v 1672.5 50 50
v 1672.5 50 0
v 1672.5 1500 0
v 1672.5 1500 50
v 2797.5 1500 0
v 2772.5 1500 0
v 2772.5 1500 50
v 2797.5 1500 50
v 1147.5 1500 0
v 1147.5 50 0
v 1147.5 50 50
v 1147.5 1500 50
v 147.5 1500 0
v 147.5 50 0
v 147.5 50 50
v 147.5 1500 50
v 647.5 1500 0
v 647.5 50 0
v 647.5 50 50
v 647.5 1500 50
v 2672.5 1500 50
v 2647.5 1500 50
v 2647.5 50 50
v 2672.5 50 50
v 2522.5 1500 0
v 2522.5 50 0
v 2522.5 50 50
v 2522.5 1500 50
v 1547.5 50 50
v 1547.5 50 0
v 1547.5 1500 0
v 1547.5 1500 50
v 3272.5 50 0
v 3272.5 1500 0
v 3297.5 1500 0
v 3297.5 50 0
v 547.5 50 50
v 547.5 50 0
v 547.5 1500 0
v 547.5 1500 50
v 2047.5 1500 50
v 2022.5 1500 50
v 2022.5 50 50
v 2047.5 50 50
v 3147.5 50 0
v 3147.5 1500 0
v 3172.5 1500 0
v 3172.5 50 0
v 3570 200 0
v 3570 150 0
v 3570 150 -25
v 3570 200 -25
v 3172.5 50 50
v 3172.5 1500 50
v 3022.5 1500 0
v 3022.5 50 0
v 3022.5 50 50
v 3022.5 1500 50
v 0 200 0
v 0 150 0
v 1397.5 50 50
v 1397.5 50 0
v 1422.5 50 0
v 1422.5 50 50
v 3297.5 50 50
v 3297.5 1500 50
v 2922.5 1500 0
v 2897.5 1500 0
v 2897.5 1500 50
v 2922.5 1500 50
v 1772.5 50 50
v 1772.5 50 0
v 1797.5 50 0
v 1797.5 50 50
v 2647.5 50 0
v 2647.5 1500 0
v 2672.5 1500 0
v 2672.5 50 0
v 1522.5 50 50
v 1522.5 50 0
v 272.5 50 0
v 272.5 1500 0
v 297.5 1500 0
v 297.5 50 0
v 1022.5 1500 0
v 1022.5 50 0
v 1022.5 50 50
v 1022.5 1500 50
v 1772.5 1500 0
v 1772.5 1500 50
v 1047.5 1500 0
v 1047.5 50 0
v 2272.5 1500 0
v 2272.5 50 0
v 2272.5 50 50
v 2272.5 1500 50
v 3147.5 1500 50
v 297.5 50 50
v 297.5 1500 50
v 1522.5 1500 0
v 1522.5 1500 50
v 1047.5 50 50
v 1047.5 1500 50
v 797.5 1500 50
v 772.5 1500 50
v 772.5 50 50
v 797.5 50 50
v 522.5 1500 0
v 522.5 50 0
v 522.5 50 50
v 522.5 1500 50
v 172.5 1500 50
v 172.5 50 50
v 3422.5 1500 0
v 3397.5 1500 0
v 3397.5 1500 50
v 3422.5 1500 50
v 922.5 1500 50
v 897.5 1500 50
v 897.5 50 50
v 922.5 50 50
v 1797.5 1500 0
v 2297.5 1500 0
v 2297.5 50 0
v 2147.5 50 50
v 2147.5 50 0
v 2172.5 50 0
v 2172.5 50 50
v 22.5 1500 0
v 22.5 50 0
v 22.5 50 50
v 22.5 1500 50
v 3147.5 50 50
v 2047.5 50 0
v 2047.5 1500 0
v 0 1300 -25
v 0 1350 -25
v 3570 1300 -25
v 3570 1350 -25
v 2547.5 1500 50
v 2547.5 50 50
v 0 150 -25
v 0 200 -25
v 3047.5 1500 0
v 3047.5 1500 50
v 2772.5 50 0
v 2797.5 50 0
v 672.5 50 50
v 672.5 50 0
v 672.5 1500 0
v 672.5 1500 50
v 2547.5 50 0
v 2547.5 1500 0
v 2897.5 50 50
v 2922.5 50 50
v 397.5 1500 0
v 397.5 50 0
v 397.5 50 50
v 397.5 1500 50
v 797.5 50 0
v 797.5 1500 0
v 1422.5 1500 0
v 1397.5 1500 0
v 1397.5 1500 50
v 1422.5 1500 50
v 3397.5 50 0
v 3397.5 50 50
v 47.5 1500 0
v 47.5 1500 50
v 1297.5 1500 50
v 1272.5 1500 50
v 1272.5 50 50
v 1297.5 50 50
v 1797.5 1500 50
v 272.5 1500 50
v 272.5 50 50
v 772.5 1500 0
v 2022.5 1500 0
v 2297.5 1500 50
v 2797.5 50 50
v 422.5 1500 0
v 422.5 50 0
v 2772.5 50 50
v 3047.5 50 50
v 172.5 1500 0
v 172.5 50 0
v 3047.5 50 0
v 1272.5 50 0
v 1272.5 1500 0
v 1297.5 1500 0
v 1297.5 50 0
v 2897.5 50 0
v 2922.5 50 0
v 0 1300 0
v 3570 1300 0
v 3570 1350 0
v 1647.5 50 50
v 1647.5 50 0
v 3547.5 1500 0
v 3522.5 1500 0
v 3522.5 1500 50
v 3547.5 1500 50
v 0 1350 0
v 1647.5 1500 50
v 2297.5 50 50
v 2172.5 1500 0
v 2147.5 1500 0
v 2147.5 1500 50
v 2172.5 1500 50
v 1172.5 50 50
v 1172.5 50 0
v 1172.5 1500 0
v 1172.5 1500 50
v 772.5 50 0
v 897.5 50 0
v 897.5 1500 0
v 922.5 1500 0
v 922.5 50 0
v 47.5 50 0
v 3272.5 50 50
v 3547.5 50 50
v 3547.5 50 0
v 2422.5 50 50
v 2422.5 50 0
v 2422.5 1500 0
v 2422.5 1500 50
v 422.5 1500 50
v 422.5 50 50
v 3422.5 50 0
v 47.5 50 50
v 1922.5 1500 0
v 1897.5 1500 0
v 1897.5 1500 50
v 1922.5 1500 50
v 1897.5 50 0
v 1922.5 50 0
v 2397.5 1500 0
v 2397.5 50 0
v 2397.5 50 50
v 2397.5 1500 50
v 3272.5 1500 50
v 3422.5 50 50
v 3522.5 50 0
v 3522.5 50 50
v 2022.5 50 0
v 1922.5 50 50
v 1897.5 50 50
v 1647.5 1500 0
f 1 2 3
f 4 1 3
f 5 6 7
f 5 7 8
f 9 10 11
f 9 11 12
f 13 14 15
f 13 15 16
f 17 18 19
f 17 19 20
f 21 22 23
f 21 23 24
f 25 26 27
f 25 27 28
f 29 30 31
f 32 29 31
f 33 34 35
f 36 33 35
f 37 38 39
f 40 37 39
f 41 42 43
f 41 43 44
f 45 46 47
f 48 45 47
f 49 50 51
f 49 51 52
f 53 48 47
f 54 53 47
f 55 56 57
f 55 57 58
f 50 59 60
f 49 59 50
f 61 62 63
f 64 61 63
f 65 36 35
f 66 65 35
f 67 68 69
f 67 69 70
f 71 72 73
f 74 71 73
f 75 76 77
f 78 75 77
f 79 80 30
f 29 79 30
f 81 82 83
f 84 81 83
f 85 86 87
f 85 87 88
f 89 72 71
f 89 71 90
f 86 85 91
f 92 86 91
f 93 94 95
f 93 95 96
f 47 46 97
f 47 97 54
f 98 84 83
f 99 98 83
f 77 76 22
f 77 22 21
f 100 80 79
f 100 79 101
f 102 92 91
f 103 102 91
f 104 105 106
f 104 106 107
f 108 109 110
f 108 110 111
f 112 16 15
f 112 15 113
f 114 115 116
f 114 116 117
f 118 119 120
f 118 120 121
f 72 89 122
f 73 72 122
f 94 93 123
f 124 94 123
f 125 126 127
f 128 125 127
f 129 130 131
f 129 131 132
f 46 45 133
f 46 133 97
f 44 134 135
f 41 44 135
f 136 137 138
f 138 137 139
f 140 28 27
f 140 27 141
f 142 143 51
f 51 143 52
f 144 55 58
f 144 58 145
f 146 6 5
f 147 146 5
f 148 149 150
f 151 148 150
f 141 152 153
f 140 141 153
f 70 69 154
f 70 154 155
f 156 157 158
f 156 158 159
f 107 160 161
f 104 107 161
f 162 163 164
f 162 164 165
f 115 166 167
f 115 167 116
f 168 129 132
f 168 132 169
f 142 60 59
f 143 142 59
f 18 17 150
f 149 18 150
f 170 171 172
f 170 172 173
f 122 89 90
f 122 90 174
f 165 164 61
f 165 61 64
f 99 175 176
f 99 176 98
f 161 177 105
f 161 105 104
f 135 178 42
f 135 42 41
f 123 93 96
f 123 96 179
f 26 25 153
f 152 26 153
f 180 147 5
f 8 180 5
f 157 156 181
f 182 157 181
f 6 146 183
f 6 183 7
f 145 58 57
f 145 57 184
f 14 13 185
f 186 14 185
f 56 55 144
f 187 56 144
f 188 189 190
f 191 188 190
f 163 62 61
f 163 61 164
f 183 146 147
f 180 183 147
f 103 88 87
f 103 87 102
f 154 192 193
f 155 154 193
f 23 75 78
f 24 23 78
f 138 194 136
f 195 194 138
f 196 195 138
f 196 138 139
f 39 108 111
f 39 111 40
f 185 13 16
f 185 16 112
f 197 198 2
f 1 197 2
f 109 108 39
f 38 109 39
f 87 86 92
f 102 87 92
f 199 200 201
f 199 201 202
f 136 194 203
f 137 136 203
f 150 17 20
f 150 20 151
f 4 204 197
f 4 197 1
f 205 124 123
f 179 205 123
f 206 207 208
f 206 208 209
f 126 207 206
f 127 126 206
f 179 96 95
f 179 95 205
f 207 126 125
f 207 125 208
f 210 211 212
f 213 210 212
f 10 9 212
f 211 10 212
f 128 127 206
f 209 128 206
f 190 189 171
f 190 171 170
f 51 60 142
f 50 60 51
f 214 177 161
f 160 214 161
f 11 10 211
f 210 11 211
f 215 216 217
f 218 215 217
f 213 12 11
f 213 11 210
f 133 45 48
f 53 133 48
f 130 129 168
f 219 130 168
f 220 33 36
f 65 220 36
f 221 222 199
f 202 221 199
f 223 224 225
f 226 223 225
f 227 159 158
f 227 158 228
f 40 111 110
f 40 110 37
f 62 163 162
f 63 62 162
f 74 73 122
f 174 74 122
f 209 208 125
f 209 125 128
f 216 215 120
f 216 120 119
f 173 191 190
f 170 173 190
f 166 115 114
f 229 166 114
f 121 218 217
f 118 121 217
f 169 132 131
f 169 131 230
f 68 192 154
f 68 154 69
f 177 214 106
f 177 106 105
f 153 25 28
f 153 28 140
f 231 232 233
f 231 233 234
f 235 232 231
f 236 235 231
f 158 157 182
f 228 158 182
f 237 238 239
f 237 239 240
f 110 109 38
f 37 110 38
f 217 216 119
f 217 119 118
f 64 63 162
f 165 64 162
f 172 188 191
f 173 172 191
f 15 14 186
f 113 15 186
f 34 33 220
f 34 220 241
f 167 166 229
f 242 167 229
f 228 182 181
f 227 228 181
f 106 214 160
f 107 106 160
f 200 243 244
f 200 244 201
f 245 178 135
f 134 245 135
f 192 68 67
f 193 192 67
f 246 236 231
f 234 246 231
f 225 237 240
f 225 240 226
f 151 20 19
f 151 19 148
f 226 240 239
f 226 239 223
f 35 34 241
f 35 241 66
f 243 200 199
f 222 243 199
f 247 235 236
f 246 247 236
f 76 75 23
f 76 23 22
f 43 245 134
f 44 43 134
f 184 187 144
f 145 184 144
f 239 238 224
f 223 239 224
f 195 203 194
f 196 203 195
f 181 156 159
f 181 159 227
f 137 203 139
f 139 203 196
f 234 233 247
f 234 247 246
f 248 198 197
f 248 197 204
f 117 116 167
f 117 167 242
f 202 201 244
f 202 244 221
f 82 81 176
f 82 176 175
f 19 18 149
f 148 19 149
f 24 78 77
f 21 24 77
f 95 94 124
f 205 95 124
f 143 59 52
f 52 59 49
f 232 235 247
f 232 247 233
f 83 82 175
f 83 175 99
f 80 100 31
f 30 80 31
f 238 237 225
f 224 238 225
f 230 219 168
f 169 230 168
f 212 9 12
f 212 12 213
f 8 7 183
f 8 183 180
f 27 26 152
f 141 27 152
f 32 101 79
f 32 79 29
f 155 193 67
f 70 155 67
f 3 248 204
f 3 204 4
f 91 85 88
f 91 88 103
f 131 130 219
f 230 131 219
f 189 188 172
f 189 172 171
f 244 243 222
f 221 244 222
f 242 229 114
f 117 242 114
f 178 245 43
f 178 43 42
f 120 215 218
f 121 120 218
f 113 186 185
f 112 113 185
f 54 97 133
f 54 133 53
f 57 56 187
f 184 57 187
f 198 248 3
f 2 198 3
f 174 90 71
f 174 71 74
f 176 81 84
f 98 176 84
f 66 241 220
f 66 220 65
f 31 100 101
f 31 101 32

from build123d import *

# Parameters (mm, degrees)
F0_W     = 25
F0_H     = 1450
F1_DEPTH = 50
F2_W     = 3570
F2_H     = 50
F3_DEPTH = 25


# Not quite as in the source:
# - a feature names something its author has since deleted; it is built from what else it names


with BuildPart() as f1:
    # F0 (on Top) → F1 (new body)
    with BuildSketch(Plane.XY):
        with Locations((35, 775)):
            Rectangle(F0_W, F0_H)
    extrude(amount=F1_DEPTH)


with BuildPart() as f1b:
    # F0 (on Top) → F1, piece 2 (new body)
    with BuildSketch(Plane.XY):
        with Locations((160, 775)):
            Rectangle(F0_W, F0_H)
    extrude(amount=F1_DEPTH)


with BuildPart() as f1c:
    # F0 (on Top) → F1, piece 3 (new body)
    with BuildSketch(Plane.XY):
        with Locations((285, 775)):
            Rectangle(F0_W, F0_H)
    extrude(amount=F1_DEPTH)


with BuildPart() as f1d:
    # F0 (on Top) → F1, piece 4 (new body)
    with BuildSketch(Plane.XY):
        with Locations((410, 775)):
            Rectangle(F0_W, F0_H)
    extrude(amount=F1_DEPTH)


with BuildPart() as f1e:
    # F0 (on Top) → F1, piece 5 (new body)
    with BuildSketch(Plane.XY):
        with Locations((535, 775)):
            Rectangle(F0_W, F0_H)
    extrude(amount=F1_DEPTH)


with BuildPart() as f1f:
    # F0 (on Top) → F1, piece 6 (new body)
    with BuildSketch(Plane.XY):
        with Locations((660, 775)):
            Rectangle(F0_W, F0_H)
    extrude(amount=F1_DEPTH)


with BuildPart() as f1g:
    # F0 (on Top) → F1, piece 7 (new body)
    with BuildSketch(Plane.XY):
        with Locations((785, 775)):
            Rectangle(F0_W, F0_H)
    extrude(amount=F1_DEPTH)


with BuildPart() as f1h:
    # F0 (on Top) → F1, piece 8 (new body)
    with BuildSketch(Plane.XY):
        with Locations((910, 775)):
            Rectangle(F0_W, F0_H)
    extrude(amount=F1_DEPTH)


with BuildPart() as f1i:
    # F0 (on Top) → F1, piece 9 (new body)
    with BuildSketch(Plane.XY):
        with Locations((1035, 775)):
            Rectangle(F0_W, F0_H)
    extrude(amount=F1_DEPTH)


with BuildPart() as f1j:
    # F0 (on Top) → F1, piece 10 (new body)
    with BuildSketch(Plane.XY):
        with Locations((1160, 775)):
            Rectangle(F0_W, F0_H)
    extrude(amount=F1_DEPTH)


with BuildPart() as f1k:
    # F0 (on Top) → F1, piece 11 (new body)
    with BuildSketch(Plane.XY):
        with Locations((1285, 775)):
            Rectangle(F0_W, F0_H)
    extrude(amount=F1_DEPTH)


with BuildPart() as f1l:
    # F0 (on Top) → F1, piece 12 (new body)
    with BuildSketch(Plane.XY):
        with Locations((1410, 775)):
            Rectangle(F0_W, F0_H)
    extrude(amount=F1_DEPTH)


with BuildPart() as f1m:
    # F0 (on Top) → F1, piece 13 (new body)
    with BuildSketch(Plane.XY):
        with Locations((1535, 775)):
            Rectangle(F0_W, F0_H)
    extrude(amount=F1_DEPTH)


with BuildPart() as f1n:
    # F0 (on Top) → F1, piece 14 (new body)
    with BuildSketch(Plane.XY):
        with Locations((1660, 775)):
            Rectangle(F0_W, F0_H)
    extrude(amount=F1_DEPTH)


with BuildPart() as f1o:
    # F0 (on Top) → F1, piece 15 (new body)
    with BuildSketch(Plane.XY):
        with Locations((1785, 775)):
            Rectangle(F0_W, F0_H)
    extrude(amount=F1_DEPTH)


with BuildPart() as f1p:
    # F0 (on Top) → F1, piece 16 (new body)
    with BuildSketch(Plane.XY):
        with Locations((1910, 775)):
            Rectangle(F0_W, F0_H)
    extrude(amount=F1_DEPTH)


with BuildPart() as f1q:
    # F0 (on Top) → F1, piece 17 (new body)
    with BuildSketch(Plane.XY):
        with Locations((2035, 775)):
            Rectangle(F0_W, F0_H)
    extrude(amount=F1_DEPTH)


with BuildPart() as f1r:
    # F0 (on Top) → F1, piece 18 (new body)
    with BuildSketch(Plane.XY):
        with Locations((2160, 775)):
            Rectangle(F0_W, F0_H)
    extrude(amount=F1_DEPTH)


with BuildPart() as f1s:
    # F0 (on Top) → F1, piece 19 (new body)
    with BuildSketch(Plane.XY):
        with Locations((2285, 775)):
            Rectangle(F0_W, F0_H)
    extrude(amount=F1_DEPTH)


with BuildPart() as f1t:
    # F0 (on Top) → F1, piece 20 (new body)
    with BuildSketch(Plane.XY):
        with Locations((2410, 775)):
            Rectangle(F0_W, F0_H)
    extrude(amount=F1_DEPTH)


with BuildPart() as f1u:
    # F0 (on Top) → F1, piece 21 (new body)
    with BuildSketch(Plane.XY):
        with Locations((2535, 775)):
            Rectangle(F0_W, F0_H)
    extrude(amount=F1_DEPTH)


with BuildPart() as f1v:
    # F0 (on Top) → F1, piece 22 (new body)
    with BuildSketch(Plane.XY):
        with Locations((2660, 775)):
            Rectangle(F0_W, F0_H)
    extrude(amount=F1_DEPTH)


with BuildPart() as f1w:
    # F0 (on Top) → F1, piece 23 (new body)
    with BuildSketch(Plane.XY):
        with Locations((2785, 775)):
            Rectangle(F0_W, F0_H)
    extrude(amount=F1_DEPTH)


with BuildPart() as f1x:
    # F0 (on Top) → F1, piece 24 (new body)
    with BuildSketch(Plane.XY):
        with Locations((2910, 775)):
            Rectangle(F0_W, F0_H)
    extrude(amount=F1_DEPTH)


with BuildPart() as f1y:
    # F0 (on Top) → F1, piece 25 (new body)
    with BuildSketch(Plane.XY):
        with Locations((3035, 775)):
            Rectangle(F0_W, F0_H)
    extrude(amount=F1_DEPTH)


with BuildPart() as f1z:
    # F0 (on Top) → F1, piece 26 (new body)
    with BuildSketch(Plane.XY):
        with Locations((3160, 775)):
            Rectangle(F0_W, F0_H)
    extrude(amount=F1_DEPTH)


with BuildPart() as f1ba:
    # F0 (on Top) → F1, piece 27 (new body)
    with BuildSketch(Plane.XY):
        with Locations((3285, 775)):
            Rectangle(F0_W, F0_H)
    extrude(amount=F1_DEPTH)


with BuildPart() as f1bb:
    # F0 (on Top) → F1, piece 28 (new body)
    with BuildSketch(Plane.XY):
        with Locations((3410, 775)):
            Rectangle(F0_W, F0_H)
    extrude(amount=F1_DEPTH)


with BuildPart() as f1bc:
    # F0 (on Top) → F1, piece 29 (new body)
    with BuildSketch(Plane.XY):
        with Locations((3535, 775)):
            Rectangle(F0_W, F0_H)
    extrude(amount=F1_DEPTH)


with BuildPart() as f3:
    # F2 (on Top) → F3 (new body)
    with BuildSketch(Plane.XY):
        with Locations((1785, 175)):
            Rectangle(F2_W, F2_H)
    extrude(amount=-F3_DEPTH)


with BuildPart() as f3b:
    # F2 (on Top) → F3, piece 2 (new body)
    with BuildSketch(Plane.XY):
        with Locations((1785, 1325)):
            Rectangle(F2_W, F2_H)
    extrude(amount=-F3_DEPTH)


solid = Compound([f1.part, f1b.part, f1c.part, f1d.part, f1e.part, f1f.part, f1g.part, f1h.part, f1i.part, f1j.part, f1k.part, f1l.part, f1m.part, f1n.part, f1o.part, f1p.part, f1q.part, f1r.part, f1s.part, f1t.part, f1u.part, f1v.part, f1w.part, f1x.part, f1y.part, f1z.part, f1ba.part, f1bb.part, f1bc.part, f3.part, f3b.part])
